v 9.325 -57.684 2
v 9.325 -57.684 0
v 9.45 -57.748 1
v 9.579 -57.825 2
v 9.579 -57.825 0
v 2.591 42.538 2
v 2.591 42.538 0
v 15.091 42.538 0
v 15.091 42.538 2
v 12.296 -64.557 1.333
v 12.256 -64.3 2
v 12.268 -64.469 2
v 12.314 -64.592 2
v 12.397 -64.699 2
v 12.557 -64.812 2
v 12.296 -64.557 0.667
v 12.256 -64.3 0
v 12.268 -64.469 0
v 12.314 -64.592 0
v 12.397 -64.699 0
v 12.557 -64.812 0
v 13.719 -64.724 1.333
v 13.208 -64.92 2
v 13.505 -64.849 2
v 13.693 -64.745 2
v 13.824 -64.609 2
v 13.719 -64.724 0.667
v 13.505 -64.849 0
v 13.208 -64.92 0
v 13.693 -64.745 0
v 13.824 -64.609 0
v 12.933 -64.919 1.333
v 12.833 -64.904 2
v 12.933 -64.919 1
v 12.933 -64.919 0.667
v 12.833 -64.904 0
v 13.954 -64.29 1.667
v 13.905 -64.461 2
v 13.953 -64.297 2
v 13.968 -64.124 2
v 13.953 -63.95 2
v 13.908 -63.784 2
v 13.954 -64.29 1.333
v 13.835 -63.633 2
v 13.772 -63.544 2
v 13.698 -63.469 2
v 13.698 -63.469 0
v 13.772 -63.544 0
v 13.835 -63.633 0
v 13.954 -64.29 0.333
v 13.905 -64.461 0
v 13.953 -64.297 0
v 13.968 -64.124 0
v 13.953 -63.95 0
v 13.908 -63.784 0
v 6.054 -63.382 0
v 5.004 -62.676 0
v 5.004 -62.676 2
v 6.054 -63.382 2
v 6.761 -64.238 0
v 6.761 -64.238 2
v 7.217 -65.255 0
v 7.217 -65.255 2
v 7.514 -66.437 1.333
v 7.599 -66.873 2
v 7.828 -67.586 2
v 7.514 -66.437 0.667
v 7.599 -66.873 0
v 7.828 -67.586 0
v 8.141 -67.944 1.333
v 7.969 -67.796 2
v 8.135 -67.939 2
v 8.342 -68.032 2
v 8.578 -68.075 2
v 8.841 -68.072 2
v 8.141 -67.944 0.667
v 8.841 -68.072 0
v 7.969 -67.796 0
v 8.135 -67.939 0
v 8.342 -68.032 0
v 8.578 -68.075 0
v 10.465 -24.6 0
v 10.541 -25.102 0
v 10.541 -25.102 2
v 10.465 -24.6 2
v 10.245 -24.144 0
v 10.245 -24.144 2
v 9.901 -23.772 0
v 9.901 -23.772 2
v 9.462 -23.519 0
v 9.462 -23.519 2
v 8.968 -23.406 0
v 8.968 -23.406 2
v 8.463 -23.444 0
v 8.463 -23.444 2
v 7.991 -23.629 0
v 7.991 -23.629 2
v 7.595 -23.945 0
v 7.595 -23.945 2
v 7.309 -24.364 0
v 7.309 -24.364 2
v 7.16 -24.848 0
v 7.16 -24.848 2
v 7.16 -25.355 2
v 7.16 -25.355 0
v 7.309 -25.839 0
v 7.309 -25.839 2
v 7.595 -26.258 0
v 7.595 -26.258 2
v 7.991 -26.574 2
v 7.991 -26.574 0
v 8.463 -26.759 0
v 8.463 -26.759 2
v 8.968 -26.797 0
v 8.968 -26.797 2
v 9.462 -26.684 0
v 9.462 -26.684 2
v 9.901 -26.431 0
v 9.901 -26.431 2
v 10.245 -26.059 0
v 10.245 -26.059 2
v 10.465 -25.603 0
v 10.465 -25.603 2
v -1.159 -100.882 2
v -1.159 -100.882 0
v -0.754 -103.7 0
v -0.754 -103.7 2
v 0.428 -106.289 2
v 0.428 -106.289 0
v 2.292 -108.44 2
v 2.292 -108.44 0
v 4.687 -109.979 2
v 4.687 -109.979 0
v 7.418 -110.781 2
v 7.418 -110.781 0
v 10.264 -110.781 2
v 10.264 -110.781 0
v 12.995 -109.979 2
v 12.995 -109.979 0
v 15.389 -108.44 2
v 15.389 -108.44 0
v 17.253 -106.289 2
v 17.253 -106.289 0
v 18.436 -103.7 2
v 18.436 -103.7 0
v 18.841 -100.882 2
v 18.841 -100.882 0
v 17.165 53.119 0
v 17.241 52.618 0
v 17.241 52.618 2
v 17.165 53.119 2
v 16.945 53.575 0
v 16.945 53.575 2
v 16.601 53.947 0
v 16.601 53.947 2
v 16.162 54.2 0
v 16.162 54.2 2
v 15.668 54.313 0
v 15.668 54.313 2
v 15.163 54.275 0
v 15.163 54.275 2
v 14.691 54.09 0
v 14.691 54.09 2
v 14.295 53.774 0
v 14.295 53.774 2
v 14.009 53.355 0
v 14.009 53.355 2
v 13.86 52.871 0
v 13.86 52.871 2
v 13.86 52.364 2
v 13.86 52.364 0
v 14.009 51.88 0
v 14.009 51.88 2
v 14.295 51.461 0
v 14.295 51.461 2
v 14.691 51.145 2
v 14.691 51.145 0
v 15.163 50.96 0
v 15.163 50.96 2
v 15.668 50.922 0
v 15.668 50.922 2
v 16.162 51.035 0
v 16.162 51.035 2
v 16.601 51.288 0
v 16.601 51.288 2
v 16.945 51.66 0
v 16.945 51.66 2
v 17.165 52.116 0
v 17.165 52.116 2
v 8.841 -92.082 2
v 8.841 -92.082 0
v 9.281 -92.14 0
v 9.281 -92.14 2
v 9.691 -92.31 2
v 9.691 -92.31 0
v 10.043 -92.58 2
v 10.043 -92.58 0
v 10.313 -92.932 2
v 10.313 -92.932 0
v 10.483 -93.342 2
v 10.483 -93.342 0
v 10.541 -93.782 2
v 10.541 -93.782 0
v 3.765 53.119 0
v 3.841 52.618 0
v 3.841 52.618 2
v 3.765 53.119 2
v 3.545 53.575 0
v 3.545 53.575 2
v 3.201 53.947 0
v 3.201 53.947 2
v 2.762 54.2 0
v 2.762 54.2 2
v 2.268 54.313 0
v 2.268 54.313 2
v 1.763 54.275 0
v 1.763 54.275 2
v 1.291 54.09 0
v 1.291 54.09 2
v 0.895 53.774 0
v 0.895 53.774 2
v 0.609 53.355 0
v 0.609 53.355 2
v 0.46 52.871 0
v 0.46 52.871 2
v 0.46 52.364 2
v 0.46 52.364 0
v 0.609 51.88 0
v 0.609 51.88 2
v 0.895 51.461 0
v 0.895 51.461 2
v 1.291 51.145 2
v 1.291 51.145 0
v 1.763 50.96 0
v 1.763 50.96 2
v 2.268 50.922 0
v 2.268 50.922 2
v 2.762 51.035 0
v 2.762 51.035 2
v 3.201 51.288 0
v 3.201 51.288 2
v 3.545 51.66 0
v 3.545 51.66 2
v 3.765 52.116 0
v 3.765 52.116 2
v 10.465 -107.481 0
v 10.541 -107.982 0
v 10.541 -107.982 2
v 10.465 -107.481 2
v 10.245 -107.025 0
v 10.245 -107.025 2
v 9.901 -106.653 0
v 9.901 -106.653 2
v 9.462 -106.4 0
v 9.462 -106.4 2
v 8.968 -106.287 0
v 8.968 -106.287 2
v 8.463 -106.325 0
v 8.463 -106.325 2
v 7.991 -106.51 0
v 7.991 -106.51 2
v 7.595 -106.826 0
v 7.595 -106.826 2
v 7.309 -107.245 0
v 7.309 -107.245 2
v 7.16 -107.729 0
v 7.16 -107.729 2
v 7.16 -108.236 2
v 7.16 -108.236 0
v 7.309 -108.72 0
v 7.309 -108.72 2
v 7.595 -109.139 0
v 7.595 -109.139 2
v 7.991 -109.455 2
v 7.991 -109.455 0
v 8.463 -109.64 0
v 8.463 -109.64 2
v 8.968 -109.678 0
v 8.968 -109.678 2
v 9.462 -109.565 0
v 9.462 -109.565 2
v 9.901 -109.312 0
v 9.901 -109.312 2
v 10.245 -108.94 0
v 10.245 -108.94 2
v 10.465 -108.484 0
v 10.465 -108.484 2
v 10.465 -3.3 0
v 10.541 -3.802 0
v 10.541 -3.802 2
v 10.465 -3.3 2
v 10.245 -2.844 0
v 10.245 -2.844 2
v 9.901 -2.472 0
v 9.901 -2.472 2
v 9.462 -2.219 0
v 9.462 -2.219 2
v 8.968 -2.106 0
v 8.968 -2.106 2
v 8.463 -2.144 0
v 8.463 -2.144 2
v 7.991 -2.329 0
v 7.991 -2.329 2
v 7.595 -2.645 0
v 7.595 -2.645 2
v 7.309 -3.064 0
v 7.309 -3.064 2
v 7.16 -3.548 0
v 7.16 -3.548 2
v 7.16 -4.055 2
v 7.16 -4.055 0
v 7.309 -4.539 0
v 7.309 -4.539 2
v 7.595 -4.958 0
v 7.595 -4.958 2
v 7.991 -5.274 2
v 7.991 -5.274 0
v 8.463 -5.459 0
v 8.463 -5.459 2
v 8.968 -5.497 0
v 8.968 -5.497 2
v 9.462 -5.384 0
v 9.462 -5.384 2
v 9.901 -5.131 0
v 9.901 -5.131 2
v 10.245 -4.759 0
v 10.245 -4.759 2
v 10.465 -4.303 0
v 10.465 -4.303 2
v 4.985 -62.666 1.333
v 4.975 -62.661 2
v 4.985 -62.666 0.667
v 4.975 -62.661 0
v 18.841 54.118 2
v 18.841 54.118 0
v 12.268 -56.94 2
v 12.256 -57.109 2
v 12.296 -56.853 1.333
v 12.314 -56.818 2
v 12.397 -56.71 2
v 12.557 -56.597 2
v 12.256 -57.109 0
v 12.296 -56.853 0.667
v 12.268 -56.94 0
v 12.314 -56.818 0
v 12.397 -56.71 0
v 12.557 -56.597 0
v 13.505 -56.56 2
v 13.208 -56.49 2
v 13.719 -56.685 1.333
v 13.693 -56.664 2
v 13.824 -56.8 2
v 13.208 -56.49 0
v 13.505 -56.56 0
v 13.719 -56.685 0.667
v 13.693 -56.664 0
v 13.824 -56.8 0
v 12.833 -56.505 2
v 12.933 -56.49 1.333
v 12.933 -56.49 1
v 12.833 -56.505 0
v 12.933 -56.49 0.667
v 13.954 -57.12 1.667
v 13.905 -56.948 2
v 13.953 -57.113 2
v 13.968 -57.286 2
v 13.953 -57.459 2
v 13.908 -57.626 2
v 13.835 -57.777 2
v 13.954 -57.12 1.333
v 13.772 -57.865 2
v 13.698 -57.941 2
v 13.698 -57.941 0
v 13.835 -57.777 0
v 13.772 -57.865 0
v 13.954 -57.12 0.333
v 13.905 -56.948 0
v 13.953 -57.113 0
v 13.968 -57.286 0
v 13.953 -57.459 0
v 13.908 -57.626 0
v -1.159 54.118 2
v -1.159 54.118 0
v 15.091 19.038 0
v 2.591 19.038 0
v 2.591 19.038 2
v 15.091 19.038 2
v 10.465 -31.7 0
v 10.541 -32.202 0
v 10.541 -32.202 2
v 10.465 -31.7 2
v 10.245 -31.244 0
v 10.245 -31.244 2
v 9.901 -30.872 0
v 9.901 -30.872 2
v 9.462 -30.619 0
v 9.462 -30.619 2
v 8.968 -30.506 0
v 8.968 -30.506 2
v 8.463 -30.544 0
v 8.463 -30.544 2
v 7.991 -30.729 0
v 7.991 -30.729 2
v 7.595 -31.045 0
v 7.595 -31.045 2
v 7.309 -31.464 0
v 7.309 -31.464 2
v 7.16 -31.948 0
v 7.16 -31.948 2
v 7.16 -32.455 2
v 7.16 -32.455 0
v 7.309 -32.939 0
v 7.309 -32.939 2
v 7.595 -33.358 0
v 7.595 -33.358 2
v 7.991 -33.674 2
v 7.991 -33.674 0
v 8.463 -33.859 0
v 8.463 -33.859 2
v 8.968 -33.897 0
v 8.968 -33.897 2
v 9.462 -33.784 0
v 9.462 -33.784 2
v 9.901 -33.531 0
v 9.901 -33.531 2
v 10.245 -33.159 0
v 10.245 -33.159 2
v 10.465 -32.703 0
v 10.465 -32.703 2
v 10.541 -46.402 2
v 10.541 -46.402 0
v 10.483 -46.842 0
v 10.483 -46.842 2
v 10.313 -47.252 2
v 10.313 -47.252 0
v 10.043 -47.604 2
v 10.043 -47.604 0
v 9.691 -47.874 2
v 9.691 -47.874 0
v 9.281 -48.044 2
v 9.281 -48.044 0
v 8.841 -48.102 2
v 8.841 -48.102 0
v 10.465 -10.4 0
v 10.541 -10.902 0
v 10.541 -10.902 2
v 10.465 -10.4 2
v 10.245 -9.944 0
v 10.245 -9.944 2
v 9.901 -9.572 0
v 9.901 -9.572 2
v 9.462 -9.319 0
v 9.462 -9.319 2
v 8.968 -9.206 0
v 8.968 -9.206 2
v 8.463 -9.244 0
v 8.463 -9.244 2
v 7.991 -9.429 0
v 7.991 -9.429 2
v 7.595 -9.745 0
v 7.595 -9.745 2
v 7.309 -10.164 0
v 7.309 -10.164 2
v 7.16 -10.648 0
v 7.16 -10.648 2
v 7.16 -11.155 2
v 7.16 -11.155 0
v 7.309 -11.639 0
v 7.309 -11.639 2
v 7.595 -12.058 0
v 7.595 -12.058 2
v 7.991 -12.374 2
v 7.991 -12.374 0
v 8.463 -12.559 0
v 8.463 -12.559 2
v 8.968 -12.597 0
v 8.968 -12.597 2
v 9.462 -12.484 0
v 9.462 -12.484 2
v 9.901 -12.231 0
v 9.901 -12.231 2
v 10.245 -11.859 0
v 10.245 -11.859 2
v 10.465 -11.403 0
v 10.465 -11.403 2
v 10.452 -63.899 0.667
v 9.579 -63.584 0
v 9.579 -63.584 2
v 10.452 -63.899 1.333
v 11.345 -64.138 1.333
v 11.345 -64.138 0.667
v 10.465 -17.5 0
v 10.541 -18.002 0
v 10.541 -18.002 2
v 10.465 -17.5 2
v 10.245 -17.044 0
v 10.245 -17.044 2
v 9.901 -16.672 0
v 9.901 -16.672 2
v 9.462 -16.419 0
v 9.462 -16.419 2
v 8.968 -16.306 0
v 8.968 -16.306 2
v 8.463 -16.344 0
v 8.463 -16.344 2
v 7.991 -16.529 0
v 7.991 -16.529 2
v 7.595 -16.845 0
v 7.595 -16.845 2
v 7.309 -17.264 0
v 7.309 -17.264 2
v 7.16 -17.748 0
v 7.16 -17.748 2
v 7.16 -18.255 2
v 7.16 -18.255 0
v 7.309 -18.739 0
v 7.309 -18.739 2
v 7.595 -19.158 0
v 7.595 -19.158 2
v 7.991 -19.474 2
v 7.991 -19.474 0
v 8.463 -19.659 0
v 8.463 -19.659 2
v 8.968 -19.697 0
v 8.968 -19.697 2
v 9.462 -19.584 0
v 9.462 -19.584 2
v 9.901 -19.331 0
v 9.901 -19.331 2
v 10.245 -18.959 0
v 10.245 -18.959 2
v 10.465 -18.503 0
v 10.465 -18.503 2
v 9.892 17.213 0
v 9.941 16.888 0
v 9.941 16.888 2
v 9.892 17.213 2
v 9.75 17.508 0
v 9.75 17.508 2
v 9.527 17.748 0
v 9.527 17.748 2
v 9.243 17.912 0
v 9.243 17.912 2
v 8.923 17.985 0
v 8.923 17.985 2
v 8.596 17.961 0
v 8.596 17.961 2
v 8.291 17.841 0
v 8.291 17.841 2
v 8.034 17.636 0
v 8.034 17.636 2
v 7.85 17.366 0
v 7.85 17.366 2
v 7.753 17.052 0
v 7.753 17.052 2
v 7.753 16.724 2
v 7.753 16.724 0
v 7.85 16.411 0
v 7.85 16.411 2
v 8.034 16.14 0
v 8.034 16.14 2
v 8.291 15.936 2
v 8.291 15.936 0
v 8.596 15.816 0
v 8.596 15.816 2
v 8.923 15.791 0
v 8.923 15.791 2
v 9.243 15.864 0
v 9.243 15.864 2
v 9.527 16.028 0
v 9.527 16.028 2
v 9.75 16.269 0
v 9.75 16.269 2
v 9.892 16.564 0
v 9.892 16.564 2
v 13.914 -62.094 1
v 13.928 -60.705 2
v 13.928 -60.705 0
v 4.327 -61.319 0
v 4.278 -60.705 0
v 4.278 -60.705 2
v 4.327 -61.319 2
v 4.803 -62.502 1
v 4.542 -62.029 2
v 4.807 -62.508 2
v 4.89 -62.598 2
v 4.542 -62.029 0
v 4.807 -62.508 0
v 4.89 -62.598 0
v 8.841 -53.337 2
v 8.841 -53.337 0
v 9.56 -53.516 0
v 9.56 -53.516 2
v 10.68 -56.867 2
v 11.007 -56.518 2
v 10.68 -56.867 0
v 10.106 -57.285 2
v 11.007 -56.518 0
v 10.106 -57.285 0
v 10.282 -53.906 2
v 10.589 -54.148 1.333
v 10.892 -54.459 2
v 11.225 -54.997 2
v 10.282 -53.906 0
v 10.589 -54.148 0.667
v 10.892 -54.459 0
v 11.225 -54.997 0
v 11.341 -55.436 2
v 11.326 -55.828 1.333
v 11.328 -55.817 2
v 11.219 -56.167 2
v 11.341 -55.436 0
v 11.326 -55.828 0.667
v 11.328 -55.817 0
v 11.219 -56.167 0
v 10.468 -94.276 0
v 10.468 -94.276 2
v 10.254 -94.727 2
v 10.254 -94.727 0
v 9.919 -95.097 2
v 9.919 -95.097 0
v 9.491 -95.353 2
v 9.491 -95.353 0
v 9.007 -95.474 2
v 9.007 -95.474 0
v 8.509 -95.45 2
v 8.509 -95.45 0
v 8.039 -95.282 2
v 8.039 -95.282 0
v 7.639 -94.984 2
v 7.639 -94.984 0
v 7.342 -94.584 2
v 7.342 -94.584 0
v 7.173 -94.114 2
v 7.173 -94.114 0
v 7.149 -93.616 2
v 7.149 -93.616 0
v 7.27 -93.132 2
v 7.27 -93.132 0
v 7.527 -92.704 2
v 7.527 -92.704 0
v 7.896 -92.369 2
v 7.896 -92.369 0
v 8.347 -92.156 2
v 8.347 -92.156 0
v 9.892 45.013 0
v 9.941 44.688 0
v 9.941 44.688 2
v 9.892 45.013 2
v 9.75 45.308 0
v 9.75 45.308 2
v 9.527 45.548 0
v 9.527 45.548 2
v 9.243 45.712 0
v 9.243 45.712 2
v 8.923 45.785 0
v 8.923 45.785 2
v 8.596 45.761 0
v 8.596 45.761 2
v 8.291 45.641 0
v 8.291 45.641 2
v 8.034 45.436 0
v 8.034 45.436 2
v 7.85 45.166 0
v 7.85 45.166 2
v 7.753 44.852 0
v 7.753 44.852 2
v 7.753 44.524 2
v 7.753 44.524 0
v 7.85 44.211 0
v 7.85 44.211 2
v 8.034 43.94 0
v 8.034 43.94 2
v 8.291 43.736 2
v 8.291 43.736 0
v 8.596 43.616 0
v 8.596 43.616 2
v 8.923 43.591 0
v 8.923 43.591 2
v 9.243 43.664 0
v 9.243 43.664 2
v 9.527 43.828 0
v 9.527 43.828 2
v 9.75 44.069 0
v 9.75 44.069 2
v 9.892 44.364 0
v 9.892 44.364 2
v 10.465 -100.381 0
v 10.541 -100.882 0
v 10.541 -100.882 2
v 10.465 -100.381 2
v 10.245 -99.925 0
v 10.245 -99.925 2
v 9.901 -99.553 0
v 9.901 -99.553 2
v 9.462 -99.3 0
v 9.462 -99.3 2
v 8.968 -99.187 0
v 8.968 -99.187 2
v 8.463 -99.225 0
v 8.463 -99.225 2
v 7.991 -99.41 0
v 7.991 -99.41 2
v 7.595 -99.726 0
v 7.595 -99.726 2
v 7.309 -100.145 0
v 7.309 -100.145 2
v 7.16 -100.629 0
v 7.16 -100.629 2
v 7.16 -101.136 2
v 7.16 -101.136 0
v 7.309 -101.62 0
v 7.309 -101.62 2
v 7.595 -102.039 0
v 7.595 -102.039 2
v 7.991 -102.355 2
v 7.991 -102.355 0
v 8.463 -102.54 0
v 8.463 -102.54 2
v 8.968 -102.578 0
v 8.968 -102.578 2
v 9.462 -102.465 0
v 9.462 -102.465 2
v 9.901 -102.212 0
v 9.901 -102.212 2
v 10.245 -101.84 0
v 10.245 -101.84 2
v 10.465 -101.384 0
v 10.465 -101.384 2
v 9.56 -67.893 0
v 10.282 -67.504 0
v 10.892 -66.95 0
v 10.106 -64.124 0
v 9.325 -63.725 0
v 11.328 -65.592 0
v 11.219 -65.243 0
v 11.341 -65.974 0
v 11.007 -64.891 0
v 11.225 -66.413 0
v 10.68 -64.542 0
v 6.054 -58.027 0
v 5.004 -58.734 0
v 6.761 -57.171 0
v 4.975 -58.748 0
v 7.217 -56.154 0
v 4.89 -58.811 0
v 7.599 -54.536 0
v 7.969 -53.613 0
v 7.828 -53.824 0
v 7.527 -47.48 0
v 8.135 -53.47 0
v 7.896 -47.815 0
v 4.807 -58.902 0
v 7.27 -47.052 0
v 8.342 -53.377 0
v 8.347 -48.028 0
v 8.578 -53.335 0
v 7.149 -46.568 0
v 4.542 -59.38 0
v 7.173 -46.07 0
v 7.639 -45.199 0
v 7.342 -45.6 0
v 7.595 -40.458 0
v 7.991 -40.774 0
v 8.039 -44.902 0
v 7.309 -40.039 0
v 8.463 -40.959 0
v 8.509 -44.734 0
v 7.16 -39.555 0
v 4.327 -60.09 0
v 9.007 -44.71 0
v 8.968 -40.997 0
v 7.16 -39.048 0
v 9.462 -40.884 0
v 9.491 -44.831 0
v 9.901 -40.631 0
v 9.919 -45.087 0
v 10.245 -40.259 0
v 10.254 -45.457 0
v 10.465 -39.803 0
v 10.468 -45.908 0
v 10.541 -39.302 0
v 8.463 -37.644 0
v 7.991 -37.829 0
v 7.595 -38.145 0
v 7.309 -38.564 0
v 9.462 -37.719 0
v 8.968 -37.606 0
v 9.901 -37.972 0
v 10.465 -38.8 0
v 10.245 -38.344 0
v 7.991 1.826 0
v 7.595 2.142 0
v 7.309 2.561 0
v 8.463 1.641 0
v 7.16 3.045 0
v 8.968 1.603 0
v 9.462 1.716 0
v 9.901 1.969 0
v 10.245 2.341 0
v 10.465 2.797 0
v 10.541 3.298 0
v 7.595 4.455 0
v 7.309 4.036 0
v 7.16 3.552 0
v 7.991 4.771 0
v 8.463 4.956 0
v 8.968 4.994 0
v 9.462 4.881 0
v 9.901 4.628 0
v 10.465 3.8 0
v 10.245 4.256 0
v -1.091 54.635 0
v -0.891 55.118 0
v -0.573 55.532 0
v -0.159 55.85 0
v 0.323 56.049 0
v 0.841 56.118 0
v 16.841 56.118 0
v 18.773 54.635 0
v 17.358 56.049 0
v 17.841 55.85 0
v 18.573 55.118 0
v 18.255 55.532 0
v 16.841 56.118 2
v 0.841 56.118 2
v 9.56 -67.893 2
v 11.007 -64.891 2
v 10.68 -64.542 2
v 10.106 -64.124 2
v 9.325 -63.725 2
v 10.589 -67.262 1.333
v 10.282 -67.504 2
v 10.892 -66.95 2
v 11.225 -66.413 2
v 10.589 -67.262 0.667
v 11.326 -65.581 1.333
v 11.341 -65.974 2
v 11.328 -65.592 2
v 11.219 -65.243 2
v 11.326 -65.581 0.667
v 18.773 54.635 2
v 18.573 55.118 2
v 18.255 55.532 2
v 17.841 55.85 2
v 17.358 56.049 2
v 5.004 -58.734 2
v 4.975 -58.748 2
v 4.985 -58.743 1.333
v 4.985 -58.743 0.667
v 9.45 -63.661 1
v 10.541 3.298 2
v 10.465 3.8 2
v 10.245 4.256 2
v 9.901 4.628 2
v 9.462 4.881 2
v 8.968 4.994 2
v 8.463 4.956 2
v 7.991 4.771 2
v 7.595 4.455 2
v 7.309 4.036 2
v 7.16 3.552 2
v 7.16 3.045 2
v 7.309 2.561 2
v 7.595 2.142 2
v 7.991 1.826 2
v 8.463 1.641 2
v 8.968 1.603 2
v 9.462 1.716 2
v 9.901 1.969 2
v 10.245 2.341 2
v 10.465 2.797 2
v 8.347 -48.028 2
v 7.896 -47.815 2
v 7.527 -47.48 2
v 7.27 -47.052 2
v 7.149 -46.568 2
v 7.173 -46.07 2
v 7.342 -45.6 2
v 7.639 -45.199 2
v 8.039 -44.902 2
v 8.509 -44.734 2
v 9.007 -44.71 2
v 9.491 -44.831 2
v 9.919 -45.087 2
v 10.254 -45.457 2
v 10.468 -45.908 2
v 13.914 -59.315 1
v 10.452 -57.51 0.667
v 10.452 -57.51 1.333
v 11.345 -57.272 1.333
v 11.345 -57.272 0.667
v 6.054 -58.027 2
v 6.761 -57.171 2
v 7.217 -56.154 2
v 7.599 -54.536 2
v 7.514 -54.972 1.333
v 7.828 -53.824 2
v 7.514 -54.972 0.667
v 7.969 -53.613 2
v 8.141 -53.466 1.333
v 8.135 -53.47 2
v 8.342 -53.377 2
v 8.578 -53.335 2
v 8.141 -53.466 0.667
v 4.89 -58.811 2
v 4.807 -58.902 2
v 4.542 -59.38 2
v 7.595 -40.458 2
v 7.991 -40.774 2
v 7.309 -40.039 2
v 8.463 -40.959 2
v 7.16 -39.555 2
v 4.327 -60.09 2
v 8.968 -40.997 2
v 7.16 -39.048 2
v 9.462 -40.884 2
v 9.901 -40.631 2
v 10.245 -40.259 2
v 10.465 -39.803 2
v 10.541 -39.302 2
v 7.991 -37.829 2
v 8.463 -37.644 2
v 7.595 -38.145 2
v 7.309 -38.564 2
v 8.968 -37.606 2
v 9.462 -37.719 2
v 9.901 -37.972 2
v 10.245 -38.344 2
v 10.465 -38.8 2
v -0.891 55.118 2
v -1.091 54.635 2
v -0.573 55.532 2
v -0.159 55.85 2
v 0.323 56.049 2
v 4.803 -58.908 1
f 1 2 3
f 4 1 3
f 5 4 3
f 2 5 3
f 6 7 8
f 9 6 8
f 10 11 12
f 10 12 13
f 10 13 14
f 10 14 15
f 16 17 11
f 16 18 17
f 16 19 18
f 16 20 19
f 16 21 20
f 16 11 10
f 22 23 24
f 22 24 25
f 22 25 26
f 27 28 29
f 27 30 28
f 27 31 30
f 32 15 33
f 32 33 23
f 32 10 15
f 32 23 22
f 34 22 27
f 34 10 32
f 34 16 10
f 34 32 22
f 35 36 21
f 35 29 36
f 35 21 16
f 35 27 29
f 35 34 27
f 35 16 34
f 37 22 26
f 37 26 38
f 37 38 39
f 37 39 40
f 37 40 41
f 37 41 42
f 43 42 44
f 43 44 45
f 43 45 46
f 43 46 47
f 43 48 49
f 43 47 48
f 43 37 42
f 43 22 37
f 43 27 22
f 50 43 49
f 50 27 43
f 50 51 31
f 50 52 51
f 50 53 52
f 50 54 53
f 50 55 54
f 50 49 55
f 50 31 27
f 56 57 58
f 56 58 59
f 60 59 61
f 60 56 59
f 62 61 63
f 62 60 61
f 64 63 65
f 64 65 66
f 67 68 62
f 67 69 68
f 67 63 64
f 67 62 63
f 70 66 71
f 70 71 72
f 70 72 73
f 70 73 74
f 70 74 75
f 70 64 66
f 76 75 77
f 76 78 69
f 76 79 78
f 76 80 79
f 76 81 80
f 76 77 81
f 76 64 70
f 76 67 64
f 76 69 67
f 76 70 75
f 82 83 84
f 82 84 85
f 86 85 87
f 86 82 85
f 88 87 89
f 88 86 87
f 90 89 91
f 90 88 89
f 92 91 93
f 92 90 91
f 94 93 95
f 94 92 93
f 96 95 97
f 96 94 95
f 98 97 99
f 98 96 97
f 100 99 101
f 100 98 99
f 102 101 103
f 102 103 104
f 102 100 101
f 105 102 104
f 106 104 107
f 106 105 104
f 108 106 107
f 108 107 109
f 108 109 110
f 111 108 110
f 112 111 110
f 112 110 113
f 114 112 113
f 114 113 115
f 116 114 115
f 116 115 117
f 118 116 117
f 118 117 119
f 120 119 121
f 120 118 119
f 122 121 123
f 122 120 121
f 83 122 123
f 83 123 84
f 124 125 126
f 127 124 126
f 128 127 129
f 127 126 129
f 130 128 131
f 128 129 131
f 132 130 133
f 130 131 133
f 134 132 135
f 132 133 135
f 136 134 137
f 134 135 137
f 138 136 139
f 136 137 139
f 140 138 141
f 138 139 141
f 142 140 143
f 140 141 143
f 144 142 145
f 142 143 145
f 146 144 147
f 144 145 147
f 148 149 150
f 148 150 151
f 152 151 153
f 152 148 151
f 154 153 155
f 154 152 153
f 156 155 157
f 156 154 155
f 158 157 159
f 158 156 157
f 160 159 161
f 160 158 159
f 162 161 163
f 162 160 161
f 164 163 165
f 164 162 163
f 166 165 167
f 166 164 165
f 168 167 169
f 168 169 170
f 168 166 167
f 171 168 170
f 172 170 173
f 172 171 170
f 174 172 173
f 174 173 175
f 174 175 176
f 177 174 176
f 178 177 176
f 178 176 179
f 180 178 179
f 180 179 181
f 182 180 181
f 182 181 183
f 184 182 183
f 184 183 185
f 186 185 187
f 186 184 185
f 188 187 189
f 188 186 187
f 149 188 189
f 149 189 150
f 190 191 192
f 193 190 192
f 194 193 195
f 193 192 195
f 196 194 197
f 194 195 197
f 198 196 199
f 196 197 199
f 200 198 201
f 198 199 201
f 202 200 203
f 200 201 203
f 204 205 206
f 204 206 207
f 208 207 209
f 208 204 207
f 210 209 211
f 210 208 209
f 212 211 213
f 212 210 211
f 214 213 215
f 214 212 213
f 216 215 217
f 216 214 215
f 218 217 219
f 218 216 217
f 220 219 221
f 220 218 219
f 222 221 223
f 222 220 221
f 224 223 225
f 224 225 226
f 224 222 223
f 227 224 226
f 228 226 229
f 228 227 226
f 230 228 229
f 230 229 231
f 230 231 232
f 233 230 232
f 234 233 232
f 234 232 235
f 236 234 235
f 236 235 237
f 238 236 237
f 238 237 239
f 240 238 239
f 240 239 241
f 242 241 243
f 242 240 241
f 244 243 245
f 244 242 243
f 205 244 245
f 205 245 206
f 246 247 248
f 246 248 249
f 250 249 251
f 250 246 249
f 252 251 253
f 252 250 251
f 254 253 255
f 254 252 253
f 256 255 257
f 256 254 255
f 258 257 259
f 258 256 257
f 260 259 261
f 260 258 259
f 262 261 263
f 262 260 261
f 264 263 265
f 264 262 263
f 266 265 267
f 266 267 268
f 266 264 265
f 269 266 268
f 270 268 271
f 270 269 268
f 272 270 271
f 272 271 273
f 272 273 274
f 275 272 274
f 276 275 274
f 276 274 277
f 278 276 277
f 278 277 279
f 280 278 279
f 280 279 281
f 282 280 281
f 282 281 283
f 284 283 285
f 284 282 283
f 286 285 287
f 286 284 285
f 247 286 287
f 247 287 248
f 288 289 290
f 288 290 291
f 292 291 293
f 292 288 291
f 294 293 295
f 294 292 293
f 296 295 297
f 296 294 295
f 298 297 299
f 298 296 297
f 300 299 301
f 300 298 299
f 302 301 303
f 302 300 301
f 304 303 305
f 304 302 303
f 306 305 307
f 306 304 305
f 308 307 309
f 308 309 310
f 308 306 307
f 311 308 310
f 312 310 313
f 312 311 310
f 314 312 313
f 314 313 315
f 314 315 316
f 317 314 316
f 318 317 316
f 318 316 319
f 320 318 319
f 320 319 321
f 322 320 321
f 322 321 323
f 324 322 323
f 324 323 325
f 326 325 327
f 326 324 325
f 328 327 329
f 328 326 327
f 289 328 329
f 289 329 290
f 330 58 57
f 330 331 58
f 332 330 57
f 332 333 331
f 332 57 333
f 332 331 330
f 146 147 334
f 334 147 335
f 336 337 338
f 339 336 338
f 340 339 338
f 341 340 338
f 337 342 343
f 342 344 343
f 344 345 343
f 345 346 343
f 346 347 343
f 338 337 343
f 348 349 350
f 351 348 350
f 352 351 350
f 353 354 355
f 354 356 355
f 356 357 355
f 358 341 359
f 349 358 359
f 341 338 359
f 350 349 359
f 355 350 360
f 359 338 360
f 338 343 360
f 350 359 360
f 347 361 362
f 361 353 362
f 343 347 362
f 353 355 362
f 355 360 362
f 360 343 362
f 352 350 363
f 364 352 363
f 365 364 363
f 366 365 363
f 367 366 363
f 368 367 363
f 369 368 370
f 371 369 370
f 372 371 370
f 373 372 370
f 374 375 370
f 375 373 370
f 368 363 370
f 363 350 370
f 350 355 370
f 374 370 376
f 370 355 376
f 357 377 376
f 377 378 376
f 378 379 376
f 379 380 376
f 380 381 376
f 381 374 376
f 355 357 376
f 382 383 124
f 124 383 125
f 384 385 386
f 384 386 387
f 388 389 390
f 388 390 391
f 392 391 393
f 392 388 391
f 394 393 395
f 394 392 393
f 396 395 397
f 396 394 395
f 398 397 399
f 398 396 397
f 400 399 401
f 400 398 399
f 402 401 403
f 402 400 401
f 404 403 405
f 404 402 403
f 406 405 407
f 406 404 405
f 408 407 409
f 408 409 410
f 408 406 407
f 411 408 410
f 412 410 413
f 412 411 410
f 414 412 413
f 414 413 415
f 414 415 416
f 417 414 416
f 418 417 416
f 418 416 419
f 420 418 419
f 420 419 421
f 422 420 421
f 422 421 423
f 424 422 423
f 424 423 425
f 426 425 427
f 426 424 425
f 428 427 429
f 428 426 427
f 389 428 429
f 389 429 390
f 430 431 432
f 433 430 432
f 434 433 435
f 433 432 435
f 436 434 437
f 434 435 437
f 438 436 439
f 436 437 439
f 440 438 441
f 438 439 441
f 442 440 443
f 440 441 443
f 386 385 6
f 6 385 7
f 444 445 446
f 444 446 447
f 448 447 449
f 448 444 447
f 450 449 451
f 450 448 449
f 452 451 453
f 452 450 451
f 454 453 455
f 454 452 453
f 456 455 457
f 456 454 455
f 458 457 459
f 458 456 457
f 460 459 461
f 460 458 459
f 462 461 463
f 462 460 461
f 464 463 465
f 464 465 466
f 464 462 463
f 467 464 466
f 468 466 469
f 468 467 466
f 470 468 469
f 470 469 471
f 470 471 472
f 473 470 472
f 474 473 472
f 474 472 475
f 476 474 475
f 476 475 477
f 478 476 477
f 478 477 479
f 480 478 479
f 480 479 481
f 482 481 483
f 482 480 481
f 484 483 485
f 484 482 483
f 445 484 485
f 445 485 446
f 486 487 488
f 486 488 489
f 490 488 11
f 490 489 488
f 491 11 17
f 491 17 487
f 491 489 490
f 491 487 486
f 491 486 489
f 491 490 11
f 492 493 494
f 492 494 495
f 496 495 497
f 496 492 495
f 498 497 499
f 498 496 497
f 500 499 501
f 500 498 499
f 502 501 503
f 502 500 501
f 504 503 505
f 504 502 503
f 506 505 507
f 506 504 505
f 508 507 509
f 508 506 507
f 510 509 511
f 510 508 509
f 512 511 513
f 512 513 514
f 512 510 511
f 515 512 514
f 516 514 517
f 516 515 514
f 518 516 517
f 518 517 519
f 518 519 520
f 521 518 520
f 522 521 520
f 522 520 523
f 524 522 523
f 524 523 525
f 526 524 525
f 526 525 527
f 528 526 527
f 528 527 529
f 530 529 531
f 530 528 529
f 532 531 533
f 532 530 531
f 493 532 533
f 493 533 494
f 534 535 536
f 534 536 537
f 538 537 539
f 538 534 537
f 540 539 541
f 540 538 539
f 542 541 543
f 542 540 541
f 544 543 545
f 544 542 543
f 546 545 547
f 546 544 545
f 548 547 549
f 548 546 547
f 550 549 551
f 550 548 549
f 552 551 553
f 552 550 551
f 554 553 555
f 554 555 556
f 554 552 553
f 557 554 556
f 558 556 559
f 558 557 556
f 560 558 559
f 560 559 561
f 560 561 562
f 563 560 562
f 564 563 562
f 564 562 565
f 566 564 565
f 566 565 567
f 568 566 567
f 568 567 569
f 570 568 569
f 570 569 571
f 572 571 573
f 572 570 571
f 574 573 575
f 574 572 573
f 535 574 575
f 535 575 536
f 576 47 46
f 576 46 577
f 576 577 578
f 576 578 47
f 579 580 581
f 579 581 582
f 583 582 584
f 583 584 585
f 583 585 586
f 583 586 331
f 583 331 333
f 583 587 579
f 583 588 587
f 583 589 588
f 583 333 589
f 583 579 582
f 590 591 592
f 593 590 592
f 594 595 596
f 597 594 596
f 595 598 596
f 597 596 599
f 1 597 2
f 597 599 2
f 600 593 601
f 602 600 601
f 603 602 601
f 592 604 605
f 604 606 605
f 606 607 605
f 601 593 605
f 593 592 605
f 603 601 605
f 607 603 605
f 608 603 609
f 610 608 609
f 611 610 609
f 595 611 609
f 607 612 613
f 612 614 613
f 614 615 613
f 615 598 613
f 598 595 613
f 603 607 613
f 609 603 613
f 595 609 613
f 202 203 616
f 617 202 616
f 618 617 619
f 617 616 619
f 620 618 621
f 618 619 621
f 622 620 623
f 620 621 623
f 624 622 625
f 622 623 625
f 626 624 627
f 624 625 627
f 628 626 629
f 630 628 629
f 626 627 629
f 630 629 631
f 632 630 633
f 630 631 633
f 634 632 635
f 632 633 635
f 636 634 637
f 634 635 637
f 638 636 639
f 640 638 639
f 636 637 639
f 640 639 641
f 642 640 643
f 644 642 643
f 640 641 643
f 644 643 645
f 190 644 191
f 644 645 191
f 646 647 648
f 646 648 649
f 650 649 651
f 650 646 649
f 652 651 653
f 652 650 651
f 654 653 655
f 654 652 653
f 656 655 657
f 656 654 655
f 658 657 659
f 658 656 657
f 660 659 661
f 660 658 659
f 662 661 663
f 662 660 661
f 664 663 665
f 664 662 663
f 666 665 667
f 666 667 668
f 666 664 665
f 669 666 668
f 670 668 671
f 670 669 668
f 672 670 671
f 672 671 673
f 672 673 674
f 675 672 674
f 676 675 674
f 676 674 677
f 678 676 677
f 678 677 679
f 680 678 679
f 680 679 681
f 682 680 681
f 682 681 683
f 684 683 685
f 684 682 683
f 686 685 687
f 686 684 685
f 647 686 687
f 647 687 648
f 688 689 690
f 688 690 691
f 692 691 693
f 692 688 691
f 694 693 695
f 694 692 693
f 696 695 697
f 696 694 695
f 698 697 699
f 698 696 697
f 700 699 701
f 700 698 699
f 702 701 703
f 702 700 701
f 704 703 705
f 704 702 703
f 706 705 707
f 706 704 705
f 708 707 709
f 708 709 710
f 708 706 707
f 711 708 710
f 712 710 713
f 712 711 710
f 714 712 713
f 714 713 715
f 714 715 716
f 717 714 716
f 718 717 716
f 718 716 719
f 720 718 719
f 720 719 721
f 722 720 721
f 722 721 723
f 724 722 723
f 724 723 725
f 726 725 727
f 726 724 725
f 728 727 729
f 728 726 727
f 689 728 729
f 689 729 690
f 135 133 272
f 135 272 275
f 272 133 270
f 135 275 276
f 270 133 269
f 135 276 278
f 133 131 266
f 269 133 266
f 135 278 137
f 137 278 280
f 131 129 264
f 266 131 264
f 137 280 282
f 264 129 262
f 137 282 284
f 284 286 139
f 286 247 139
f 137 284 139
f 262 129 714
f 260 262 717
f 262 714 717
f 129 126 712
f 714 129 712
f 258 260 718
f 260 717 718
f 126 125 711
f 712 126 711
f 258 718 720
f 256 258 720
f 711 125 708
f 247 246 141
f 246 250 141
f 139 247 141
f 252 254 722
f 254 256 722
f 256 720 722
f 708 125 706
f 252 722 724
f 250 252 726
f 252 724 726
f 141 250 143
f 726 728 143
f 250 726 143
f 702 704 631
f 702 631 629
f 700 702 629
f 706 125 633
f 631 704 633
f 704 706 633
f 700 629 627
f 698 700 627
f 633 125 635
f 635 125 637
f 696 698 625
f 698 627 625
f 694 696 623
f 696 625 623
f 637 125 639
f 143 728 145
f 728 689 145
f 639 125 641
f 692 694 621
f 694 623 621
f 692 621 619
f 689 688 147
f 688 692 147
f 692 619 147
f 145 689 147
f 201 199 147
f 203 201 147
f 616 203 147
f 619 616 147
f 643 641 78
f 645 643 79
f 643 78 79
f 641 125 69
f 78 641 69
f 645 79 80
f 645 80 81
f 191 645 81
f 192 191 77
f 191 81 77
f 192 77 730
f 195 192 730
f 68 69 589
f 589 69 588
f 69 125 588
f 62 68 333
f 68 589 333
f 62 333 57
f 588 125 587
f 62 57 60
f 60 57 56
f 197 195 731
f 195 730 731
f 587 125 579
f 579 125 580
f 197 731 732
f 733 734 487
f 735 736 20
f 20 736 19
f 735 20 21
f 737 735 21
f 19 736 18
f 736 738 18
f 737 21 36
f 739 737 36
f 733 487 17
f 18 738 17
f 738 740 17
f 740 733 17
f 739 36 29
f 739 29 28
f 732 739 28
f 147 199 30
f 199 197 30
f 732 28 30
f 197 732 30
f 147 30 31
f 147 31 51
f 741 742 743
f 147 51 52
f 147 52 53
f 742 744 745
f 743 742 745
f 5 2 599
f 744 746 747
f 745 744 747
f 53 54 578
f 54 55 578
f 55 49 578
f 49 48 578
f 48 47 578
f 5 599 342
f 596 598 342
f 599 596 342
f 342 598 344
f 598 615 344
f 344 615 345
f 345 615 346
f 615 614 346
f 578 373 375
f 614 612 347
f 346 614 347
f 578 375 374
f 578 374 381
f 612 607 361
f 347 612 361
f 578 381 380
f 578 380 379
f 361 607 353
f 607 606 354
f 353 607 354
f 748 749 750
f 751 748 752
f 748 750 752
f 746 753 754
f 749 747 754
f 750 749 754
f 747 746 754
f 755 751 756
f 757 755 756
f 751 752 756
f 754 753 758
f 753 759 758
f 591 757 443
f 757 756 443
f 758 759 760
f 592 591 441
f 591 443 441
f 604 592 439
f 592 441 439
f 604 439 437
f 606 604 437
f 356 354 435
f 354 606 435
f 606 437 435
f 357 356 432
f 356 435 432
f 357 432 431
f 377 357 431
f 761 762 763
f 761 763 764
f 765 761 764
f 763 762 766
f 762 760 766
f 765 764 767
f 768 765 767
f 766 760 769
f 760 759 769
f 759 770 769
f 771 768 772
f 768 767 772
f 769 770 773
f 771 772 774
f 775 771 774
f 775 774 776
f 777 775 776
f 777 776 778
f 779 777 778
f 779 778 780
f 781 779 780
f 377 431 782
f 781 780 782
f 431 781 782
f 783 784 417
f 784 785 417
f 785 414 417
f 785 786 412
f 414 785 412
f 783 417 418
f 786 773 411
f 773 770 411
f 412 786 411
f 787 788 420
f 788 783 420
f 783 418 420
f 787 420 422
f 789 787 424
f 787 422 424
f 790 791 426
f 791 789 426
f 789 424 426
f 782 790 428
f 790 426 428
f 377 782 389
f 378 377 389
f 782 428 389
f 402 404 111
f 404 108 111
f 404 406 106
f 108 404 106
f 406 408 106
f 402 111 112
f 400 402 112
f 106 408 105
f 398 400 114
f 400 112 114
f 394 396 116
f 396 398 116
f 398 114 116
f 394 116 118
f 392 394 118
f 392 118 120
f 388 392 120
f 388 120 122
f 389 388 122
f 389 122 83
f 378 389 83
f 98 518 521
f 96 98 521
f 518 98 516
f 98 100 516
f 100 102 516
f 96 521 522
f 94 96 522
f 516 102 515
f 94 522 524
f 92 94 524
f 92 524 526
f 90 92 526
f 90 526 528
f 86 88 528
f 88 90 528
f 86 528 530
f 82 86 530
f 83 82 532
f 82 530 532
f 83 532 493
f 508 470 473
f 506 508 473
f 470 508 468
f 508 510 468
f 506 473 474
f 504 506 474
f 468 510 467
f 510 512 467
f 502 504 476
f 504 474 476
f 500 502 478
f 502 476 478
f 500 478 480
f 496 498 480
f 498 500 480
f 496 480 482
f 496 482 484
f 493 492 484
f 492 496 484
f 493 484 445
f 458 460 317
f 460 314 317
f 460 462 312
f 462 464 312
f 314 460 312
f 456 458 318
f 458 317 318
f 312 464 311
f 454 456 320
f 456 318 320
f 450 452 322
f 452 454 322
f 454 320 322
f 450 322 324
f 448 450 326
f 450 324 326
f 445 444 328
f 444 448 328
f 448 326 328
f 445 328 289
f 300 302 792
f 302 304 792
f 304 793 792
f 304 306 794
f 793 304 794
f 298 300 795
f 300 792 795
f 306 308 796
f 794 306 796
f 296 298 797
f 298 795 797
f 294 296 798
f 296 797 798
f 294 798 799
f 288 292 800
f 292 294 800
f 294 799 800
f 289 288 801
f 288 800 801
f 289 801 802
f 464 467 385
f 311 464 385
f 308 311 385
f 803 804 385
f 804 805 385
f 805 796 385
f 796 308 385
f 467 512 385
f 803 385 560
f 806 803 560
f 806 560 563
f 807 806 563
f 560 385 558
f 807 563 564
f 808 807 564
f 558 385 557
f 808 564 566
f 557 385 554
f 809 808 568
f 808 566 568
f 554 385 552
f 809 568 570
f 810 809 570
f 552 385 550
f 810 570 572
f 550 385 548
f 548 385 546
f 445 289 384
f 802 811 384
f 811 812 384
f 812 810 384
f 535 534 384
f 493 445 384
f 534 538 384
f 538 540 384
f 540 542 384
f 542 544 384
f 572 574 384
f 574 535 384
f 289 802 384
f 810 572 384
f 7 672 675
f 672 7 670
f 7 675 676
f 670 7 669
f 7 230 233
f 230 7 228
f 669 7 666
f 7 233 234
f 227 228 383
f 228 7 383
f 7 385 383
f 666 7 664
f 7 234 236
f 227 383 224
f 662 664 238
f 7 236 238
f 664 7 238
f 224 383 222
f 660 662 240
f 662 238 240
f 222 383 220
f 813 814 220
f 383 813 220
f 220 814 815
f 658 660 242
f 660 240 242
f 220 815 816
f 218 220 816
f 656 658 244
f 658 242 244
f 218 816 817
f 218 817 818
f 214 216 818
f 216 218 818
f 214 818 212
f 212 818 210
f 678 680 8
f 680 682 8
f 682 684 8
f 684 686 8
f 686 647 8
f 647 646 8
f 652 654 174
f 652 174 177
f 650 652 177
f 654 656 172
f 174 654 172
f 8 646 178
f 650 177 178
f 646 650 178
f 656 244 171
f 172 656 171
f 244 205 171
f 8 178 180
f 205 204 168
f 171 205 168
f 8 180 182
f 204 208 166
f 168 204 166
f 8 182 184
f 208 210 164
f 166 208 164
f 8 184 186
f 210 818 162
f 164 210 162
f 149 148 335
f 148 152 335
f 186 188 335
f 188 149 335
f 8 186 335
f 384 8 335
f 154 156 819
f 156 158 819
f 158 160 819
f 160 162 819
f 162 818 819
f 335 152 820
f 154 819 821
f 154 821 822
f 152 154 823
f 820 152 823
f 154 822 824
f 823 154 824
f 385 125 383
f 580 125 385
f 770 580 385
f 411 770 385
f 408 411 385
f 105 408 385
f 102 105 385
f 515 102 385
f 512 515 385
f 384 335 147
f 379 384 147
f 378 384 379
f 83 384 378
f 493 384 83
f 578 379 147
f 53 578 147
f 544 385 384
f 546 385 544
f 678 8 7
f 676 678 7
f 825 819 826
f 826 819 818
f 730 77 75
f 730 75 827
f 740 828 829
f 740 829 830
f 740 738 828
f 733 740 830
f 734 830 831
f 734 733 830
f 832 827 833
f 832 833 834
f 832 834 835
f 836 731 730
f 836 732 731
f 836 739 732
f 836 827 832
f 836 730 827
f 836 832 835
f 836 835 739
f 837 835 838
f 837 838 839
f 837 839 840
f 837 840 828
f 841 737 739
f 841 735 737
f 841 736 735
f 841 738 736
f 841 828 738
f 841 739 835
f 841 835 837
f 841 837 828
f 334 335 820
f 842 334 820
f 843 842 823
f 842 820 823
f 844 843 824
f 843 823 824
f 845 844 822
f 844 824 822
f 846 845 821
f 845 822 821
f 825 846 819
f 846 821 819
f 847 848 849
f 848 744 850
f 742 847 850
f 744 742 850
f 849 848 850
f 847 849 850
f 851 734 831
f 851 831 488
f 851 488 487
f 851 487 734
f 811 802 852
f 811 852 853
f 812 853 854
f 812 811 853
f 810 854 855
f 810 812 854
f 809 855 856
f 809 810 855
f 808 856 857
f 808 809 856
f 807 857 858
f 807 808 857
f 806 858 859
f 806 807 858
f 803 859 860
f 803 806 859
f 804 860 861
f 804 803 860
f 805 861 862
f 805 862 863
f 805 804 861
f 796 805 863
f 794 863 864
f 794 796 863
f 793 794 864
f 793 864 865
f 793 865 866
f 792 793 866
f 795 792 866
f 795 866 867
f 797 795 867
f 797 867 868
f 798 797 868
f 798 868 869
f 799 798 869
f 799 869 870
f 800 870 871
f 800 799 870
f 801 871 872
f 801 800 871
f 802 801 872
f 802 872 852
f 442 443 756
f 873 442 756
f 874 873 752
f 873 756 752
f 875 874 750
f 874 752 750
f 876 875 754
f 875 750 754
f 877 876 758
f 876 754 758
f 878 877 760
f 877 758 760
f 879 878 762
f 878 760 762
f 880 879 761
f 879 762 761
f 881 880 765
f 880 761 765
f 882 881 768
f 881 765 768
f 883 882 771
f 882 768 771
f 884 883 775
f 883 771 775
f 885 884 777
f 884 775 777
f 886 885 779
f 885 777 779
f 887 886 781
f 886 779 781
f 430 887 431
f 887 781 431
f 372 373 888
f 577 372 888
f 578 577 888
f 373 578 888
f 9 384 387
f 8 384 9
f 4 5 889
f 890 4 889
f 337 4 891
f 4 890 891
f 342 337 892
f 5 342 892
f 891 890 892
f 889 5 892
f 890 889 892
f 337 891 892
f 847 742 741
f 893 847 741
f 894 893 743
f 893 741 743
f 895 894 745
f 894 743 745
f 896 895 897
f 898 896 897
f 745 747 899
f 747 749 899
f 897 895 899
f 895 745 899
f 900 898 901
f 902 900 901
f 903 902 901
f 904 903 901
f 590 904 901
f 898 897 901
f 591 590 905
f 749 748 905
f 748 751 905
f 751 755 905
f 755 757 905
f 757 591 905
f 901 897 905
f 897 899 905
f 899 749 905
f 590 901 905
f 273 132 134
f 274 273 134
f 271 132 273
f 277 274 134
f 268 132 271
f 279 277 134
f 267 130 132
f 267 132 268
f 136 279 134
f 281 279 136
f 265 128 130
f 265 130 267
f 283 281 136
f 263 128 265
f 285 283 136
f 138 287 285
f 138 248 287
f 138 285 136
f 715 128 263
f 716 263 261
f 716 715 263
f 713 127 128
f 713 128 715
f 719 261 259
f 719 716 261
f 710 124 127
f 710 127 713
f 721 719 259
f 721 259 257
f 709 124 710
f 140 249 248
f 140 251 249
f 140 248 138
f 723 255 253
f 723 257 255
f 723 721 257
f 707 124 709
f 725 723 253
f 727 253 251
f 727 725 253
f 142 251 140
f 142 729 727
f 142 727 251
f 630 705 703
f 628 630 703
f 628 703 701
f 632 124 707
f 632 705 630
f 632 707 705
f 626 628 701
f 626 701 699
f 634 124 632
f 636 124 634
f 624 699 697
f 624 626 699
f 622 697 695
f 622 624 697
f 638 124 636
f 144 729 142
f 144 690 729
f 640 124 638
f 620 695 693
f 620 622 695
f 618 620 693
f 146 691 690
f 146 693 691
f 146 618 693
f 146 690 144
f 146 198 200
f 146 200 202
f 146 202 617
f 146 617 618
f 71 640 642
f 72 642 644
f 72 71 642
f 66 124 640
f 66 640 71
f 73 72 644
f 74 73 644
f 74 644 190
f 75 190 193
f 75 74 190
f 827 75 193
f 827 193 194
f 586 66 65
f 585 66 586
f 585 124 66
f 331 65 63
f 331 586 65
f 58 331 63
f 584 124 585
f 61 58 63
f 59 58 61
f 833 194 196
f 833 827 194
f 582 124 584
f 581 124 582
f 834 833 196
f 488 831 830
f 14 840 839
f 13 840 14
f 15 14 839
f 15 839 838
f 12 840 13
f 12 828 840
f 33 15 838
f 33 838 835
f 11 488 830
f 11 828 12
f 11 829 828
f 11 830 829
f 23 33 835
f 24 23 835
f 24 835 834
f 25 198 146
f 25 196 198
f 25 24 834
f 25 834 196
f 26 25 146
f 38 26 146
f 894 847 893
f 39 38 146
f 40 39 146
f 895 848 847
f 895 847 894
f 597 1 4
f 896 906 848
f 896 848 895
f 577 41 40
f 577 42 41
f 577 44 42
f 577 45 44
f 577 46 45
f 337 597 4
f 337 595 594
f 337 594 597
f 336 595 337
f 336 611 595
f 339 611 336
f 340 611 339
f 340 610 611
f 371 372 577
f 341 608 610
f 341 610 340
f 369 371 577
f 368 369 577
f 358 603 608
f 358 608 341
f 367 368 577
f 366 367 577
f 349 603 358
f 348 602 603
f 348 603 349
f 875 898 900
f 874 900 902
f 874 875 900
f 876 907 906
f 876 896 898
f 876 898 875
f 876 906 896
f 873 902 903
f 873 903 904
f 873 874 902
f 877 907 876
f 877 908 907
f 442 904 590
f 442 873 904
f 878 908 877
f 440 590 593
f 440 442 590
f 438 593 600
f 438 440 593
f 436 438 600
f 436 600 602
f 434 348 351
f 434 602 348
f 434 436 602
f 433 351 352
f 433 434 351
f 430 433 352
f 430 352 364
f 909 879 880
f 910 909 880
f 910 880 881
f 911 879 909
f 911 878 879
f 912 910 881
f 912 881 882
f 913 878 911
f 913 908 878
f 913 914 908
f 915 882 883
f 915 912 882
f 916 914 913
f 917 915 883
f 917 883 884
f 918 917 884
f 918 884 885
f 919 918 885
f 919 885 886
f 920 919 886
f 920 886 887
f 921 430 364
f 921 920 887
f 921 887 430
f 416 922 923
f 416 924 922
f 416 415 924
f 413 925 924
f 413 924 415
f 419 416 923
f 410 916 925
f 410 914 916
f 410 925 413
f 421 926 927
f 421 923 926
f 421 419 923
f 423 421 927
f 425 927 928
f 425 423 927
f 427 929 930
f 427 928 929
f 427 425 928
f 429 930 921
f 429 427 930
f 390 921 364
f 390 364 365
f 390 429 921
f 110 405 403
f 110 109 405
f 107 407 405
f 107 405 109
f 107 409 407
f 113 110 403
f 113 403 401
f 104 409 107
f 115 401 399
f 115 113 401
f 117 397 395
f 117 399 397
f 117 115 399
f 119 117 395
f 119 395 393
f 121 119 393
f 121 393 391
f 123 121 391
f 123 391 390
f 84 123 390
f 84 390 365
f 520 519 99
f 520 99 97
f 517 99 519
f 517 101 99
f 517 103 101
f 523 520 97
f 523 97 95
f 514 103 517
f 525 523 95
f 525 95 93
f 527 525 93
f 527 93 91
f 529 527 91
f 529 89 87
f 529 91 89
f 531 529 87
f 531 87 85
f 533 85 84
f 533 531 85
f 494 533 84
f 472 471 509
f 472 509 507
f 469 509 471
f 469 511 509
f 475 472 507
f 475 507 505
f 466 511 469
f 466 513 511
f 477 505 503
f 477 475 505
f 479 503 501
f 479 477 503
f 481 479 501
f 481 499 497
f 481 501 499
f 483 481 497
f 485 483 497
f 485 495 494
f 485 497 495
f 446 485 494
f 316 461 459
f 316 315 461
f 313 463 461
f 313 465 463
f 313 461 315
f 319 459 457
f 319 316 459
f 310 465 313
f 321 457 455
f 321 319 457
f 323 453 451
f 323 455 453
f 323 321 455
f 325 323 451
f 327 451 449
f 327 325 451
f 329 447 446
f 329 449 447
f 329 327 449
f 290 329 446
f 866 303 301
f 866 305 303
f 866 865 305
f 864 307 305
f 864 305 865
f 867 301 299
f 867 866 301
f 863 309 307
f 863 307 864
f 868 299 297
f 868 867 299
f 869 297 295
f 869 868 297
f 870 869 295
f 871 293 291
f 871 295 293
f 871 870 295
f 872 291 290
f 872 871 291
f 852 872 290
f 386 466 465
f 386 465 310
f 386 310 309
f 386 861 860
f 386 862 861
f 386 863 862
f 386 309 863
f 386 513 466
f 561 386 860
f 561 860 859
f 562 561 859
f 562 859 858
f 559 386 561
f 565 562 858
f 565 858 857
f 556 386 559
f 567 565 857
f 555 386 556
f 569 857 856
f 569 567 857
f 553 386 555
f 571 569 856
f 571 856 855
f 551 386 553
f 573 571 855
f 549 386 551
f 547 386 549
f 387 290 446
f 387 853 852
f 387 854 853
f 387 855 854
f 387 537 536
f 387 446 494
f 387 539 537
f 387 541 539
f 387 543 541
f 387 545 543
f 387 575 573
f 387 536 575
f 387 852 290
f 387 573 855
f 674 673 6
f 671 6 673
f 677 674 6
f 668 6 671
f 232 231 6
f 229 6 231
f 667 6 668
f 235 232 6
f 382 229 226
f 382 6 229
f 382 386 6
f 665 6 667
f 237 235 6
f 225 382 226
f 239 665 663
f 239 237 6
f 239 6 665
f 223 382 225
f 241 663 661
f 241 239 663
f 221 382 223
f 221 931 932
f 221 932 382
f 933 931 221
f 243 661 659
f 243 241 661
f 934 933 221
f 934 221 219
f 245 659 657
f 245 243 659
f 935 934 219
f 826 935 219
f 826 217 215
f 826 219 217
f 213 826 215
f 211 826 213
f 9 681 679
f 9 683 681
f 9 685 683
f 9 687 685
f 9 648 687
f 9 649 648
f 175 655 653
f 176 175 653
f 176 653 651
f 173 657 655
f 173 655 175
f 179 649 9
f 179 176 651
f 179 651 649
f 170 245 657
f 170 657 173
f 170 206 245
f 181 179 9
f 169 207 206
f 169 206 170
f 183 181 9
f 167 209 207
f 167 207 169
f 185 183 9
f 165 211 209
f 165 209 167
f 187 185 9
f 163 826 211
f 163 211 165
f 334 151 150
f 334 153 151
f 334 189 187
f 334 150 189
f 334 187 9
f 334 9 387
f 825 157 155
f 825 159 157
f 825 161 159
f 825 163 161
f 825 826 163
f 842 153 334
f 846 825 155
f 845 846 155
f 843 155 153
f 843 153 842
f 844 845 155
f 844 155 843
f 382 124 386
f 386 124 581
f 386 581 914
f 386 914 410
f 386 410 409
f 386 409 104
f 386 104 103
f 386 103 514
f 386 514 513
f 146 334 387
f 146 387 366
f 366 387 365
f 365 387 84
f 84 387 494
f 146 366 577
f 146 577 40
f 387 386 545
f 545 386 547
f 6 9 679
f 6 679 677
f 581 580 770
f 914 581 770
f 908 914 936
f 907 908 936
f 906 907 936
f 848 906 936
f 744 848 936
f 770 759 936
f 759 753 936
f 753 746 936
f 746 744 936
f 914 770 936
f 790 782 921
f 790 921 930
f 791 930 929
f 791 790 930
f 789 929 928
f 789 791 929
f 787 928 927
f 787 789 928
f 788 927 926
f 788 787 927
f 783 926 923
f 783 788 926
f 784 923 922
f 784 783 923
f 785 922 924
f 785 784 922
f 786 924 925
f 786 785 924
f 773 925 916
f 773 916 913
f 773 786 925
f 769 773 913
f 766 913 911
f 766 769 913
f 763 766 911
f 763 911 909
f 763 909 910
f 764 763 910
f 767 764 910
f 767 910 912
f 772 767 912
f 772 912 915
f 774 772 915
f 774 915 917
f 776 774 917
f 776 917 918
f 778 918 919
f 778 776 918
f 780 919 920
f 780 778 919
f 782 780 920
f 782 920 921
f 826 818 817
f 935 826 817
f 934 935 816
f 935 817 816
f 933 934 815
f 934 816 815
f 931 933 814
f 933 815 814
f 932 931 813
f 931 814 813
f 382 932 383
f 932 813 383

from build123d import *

# Parameters (mm, degrees)
SKETCH_3_R      = 1.700000006
SKETCH_3_R_2    = 1.100000006
SKETCH_3_W      = 12.5
SKETCH_3_H      = 23.5
EXTRUDE_2_DEPTH = 2


with BuildPart() as part:
    # 草图3 → 凸台-拉伸2 (new body)
    with BuildSketch(Plane.XY):
        with BuildLine():
            Line((16.840804288, 56.117583031), (0.840804288, 56.117583031))
            ThreePointArc((0.840804288, 56.117583031), (-0.573409274, 55.531796593), (-1.159195712, 54.117583031))
            Line((-1.159195712, 54.117583031), (-1.159195712, -100.882416969))
            ThreePointArc((-1.159195712, -100.882416969), (8.840804288, -110.882416969), (18.840804288, -100.882416969))
            Line((18.840804288, -100.882416969), (18.840804288, 54.117583031))
            ThreePointArc((18.840804288, 54.117583031), (18.255017851, 55.531796593), (16.840804288, 56.117583031))
        make_face()
        with Locations((8.840804288, -107.982416969)):
            Circle(SKETCH_3_R, mode=Mode.SUBTRACT)
        with BuildLine():
            ThreePointArc((10.540804288, -93.782416969), (7.63872276, -94.984498497), (8.840804288, -92.082416969))
            ThreePointArc((8.840804288, -92.082416969), (10.042885816, -92.580335441), (10.540804288, -93.782416969))
        make_face(mode=Mode.SUBTRACT)
        with BuildLine():
            ThreePointArc((10.540804294, -46.401557681), (10.04288582, -47.603639213), (8.840804288, -48.101557686))
            ThreePointArc((8.840804288, -48.101557686), (7.638722756, -45.199476149), (10.540804294, -46.401557681))
        make_face(mode=Mode.SUBTRACT)
        with Locations((8.840804288, -39.301557681)):
            Circle(SKETCH_3_R, mode=Mode.SUBTRACT)
        with Locations((8.840804288, -32.201557681)):
            Circle(SKETCH_3_R, mode=Mode.SUBTRACT)
        with Locations((8.840804288, -100.882416969)):
            Circle(SKETCH_3_R, mode=Mode.SUBTRACT)
        with BuildLine():
            add(Edge.make_bspline(
                [(8.840804288, -68.07230608), (10.518584029, -67.9276906), (13.271622127, -65.4378125), (9.324741551, -63.725127446)],
                knots=[0.615915535, 0.615915535, 0.615915535, 0.615915535, 1, 1, 1, 1], degree=3))
            add(Edge.make_bspline(
                [(5.004317127, -62.675716717), (6.671990842, -63.522758583), (7.358746233, -65.159768504), (7.765991833, -67.969605562), (8.568188953, -68.095804038), (8.840804288, -68.07230608)],
                knots=[0.002348501, 0.002348501, 0.002348501, 0.002348501, 0.410926836, 0.553507274, 0.615915535, 0.615915535, 0.615915535, 0.615915535], degree=3))
            add(Edge.make_bspline(
                [(4.975444833, -62.661146677), (4.985052333, -62.666591164), (4.994678321, -62.671455775), (5.004317127, -62.675716717)],
                knots=[0.565822578, 0.565822578, 0.565822578, 0.565822578, 0.579602808, 0.579602808, 0.579602808, 0.579602808], degree=3))
            add(Edge.make_bspline(
                [(4.278018154, -60.704640985), (4.226627162, -61.157219039), (4.526861731, -62.258746315), (4.916709377, -62.627861804), (4.975444833, -62.661146677)],
                knots=[0, 0, 0, 0, 0.481577142, 0.565822578, 0.565822578, 0.565822578, 0.565822578], degree=3))
            add(Edge.make_bspline(
                [(4.278018154, -60.704640985), (4.226627162, -60.252062931), (4.526861731, -59.150535655), (4.916709377, -58.781420166), (4.975444833, -58.748135293)],
                knots=[0, 0, 0, 0, 0.481577142, 0.565822578, 0.565822578, 0.565822578, 0.565822578], degree=3))
            add(Edge.make_bspline(
                [(4.975444833, -58.748135293), (4.985052333, -58.742690806), (4.994678321, -58.737826195), (5.004317127, -58.733565253)],
                knots=[0.565822578, 0.565822578, 0.565822578, 0.565822578, 0.579602808, 0.579602808, 0.579602808, 0.579602808], degree=3))
            add(Edge.make_bspline(
                [(5.004317127, -58.733565253), (6.671990842, -57.886523387), (7.358746233, -56.249513466), (7.765991833, -53.439676408), (8.568188953, -53.313477932), (8.840804288, -53.33697589)],
                knots=[0.002348501, 0.002348501, 0.002348501, 0.002348501, 0.410926836, 0.553507274, 0.615915535, 0.615915535, 0.615915535, 0.615915535], degree=3))
            add(Edge.make_bspline(
                [(8.840804288, -53.33697589), (10.518584029, -53.481591371), (13.271622127, -55.97146947), (9.324741551, -57.684154524)],
                knots=[0.615915535, 0.615915535, 0.615915535, 0.615915535, 1, 1, 1, 1], degree=3))
            add(Edge.make_bspline(
                [(9.324741551, -57.684154524), (9.448361201, -57.741607127), (9.579397012, -57.825403241)],
                knots=[0.879374293, 0.879374293, 0.879374293, 1, 1, 1], degree=2))
            add(Edge.make_bspline(
                [(9.579397012, -57.825403241), (10.442809677, -57.472287252), (11.335132803, -57.233463092), (12.256366661, -57.108930725)],
                knots=[0, 0, 0, 0, 0.985819408, 0.985819408, 0.985819408, 0.985819408], degree=3))
            add(Edge.make_bspline(
                [(12.256366661, -57.108930725), (12.250375457, -57.017628974), (12.324042897, -56.451578095), (14.134987008, -56.284356721), (14.027647091, -57.656331575), (13.69790824, -57.940504606)],
                knots=[0.192175897, 0.192175897, 0.192175897, 0.192175897, 0.262471761, 0.642903714, 1, 1, 1, 1], degree=3))
            add(Edge.make_bspline(
                [(13.69790824, -57.940504606), (14.014754559, -59.307854638), (13.928049408, -60.704640985)],
                knots=[0, 0, 0, 1, 1, 1], degree=2))
            add(Edge.make_bspline(
                [(13.69790824, -63.468777364), (14.014754559, -62.101427332), (13.928049408, -60.704640985)],
                knots=[0, 0, 0, 1, 1, 1], degree=2))
            add(Edge.make_bspline(
                [(12.256366661, -64.300351246), (12.250375457, -64.391652996), (12.324042897, -64.957703875), (14.134987008, -65.124925249), (14.027647091, -63.752950395), (13.69790824, -63.468777364)],
                knots=[0.192175897, 0.192175897, 0.192175897, 0.192175897, 0.262471761, 0.642903714, 1, 1, 1, 1], degree=3))
            add(Edge.make_bspline(
                [(9.579397012, -63.583878729), (10.442809677, -63.936994718), (11.335132803, -64.175818878), (12.256366661, -64.300351246)],
                knots=[0, 0, 0, 0, 0.985819408, 0.985819408, 0.985819408, 0.985819408], degree=3))
            add(Edge.make_bspline(
                [(9.324741551, -63.725127446), (9.448361201, -63.667674843), (9.579397012, -63.583878729)],
                knots=[0.879374293, 0.879374293, 0.879374293, 1, 1, 1], degree=2))
        make_face(mode=Mode.SUBTRACT)
        with Locations((8.840804288, -25.101557681)):
            Circle(SKETCH_3_R, mode=Mode.SUBTRACT)
        with Locations((8.840804288, -18.001557681)):
            Circle(SKETCH_3_R, mode=Mode.SUBTRACT)
        with Locations((8.840804288, -10.901557681)):
            Circle(SKETCH_3_R, mode=Mode.SUBTRACT)
        with Locations((8.840804288, -3.801557681)):
            Circle(SKETCH_3_R, mode=Mode.SUBTRACT)
        with Locations((8.840804288, 3.298442319)):
            Circle(SKETCH_3_R, mode=Mode.SUBTRACT)
        with Locations((2.140804288, 52.617583031)):
            Circle(SKETCH_3_R, mode=Mode.SUBTRACT)
        with Locations((8.840804288, 16.888295099)):
            Circle(SKETCH_3_R_2, mode=Mode.SUBTRACT)
        with Locations((8.840804288, 30.788295099)):
            Rectangle(SKETCH_3_W, SKETCH_3_H, mode=Mode.SUBTRACT)
        with Locations((8.840804288, 44.688295099)):
            Circle(SKETCH_3_R_2, mode=Mode.SUBTRACT)
        with Locations((15.540804288, 52.617583031)):
            Circle(SKETCH_3_R, mode=Mode.SUBTRACT)
    extrude(amount=EXTRUDE_2_DEPTH)


solid = part.part
